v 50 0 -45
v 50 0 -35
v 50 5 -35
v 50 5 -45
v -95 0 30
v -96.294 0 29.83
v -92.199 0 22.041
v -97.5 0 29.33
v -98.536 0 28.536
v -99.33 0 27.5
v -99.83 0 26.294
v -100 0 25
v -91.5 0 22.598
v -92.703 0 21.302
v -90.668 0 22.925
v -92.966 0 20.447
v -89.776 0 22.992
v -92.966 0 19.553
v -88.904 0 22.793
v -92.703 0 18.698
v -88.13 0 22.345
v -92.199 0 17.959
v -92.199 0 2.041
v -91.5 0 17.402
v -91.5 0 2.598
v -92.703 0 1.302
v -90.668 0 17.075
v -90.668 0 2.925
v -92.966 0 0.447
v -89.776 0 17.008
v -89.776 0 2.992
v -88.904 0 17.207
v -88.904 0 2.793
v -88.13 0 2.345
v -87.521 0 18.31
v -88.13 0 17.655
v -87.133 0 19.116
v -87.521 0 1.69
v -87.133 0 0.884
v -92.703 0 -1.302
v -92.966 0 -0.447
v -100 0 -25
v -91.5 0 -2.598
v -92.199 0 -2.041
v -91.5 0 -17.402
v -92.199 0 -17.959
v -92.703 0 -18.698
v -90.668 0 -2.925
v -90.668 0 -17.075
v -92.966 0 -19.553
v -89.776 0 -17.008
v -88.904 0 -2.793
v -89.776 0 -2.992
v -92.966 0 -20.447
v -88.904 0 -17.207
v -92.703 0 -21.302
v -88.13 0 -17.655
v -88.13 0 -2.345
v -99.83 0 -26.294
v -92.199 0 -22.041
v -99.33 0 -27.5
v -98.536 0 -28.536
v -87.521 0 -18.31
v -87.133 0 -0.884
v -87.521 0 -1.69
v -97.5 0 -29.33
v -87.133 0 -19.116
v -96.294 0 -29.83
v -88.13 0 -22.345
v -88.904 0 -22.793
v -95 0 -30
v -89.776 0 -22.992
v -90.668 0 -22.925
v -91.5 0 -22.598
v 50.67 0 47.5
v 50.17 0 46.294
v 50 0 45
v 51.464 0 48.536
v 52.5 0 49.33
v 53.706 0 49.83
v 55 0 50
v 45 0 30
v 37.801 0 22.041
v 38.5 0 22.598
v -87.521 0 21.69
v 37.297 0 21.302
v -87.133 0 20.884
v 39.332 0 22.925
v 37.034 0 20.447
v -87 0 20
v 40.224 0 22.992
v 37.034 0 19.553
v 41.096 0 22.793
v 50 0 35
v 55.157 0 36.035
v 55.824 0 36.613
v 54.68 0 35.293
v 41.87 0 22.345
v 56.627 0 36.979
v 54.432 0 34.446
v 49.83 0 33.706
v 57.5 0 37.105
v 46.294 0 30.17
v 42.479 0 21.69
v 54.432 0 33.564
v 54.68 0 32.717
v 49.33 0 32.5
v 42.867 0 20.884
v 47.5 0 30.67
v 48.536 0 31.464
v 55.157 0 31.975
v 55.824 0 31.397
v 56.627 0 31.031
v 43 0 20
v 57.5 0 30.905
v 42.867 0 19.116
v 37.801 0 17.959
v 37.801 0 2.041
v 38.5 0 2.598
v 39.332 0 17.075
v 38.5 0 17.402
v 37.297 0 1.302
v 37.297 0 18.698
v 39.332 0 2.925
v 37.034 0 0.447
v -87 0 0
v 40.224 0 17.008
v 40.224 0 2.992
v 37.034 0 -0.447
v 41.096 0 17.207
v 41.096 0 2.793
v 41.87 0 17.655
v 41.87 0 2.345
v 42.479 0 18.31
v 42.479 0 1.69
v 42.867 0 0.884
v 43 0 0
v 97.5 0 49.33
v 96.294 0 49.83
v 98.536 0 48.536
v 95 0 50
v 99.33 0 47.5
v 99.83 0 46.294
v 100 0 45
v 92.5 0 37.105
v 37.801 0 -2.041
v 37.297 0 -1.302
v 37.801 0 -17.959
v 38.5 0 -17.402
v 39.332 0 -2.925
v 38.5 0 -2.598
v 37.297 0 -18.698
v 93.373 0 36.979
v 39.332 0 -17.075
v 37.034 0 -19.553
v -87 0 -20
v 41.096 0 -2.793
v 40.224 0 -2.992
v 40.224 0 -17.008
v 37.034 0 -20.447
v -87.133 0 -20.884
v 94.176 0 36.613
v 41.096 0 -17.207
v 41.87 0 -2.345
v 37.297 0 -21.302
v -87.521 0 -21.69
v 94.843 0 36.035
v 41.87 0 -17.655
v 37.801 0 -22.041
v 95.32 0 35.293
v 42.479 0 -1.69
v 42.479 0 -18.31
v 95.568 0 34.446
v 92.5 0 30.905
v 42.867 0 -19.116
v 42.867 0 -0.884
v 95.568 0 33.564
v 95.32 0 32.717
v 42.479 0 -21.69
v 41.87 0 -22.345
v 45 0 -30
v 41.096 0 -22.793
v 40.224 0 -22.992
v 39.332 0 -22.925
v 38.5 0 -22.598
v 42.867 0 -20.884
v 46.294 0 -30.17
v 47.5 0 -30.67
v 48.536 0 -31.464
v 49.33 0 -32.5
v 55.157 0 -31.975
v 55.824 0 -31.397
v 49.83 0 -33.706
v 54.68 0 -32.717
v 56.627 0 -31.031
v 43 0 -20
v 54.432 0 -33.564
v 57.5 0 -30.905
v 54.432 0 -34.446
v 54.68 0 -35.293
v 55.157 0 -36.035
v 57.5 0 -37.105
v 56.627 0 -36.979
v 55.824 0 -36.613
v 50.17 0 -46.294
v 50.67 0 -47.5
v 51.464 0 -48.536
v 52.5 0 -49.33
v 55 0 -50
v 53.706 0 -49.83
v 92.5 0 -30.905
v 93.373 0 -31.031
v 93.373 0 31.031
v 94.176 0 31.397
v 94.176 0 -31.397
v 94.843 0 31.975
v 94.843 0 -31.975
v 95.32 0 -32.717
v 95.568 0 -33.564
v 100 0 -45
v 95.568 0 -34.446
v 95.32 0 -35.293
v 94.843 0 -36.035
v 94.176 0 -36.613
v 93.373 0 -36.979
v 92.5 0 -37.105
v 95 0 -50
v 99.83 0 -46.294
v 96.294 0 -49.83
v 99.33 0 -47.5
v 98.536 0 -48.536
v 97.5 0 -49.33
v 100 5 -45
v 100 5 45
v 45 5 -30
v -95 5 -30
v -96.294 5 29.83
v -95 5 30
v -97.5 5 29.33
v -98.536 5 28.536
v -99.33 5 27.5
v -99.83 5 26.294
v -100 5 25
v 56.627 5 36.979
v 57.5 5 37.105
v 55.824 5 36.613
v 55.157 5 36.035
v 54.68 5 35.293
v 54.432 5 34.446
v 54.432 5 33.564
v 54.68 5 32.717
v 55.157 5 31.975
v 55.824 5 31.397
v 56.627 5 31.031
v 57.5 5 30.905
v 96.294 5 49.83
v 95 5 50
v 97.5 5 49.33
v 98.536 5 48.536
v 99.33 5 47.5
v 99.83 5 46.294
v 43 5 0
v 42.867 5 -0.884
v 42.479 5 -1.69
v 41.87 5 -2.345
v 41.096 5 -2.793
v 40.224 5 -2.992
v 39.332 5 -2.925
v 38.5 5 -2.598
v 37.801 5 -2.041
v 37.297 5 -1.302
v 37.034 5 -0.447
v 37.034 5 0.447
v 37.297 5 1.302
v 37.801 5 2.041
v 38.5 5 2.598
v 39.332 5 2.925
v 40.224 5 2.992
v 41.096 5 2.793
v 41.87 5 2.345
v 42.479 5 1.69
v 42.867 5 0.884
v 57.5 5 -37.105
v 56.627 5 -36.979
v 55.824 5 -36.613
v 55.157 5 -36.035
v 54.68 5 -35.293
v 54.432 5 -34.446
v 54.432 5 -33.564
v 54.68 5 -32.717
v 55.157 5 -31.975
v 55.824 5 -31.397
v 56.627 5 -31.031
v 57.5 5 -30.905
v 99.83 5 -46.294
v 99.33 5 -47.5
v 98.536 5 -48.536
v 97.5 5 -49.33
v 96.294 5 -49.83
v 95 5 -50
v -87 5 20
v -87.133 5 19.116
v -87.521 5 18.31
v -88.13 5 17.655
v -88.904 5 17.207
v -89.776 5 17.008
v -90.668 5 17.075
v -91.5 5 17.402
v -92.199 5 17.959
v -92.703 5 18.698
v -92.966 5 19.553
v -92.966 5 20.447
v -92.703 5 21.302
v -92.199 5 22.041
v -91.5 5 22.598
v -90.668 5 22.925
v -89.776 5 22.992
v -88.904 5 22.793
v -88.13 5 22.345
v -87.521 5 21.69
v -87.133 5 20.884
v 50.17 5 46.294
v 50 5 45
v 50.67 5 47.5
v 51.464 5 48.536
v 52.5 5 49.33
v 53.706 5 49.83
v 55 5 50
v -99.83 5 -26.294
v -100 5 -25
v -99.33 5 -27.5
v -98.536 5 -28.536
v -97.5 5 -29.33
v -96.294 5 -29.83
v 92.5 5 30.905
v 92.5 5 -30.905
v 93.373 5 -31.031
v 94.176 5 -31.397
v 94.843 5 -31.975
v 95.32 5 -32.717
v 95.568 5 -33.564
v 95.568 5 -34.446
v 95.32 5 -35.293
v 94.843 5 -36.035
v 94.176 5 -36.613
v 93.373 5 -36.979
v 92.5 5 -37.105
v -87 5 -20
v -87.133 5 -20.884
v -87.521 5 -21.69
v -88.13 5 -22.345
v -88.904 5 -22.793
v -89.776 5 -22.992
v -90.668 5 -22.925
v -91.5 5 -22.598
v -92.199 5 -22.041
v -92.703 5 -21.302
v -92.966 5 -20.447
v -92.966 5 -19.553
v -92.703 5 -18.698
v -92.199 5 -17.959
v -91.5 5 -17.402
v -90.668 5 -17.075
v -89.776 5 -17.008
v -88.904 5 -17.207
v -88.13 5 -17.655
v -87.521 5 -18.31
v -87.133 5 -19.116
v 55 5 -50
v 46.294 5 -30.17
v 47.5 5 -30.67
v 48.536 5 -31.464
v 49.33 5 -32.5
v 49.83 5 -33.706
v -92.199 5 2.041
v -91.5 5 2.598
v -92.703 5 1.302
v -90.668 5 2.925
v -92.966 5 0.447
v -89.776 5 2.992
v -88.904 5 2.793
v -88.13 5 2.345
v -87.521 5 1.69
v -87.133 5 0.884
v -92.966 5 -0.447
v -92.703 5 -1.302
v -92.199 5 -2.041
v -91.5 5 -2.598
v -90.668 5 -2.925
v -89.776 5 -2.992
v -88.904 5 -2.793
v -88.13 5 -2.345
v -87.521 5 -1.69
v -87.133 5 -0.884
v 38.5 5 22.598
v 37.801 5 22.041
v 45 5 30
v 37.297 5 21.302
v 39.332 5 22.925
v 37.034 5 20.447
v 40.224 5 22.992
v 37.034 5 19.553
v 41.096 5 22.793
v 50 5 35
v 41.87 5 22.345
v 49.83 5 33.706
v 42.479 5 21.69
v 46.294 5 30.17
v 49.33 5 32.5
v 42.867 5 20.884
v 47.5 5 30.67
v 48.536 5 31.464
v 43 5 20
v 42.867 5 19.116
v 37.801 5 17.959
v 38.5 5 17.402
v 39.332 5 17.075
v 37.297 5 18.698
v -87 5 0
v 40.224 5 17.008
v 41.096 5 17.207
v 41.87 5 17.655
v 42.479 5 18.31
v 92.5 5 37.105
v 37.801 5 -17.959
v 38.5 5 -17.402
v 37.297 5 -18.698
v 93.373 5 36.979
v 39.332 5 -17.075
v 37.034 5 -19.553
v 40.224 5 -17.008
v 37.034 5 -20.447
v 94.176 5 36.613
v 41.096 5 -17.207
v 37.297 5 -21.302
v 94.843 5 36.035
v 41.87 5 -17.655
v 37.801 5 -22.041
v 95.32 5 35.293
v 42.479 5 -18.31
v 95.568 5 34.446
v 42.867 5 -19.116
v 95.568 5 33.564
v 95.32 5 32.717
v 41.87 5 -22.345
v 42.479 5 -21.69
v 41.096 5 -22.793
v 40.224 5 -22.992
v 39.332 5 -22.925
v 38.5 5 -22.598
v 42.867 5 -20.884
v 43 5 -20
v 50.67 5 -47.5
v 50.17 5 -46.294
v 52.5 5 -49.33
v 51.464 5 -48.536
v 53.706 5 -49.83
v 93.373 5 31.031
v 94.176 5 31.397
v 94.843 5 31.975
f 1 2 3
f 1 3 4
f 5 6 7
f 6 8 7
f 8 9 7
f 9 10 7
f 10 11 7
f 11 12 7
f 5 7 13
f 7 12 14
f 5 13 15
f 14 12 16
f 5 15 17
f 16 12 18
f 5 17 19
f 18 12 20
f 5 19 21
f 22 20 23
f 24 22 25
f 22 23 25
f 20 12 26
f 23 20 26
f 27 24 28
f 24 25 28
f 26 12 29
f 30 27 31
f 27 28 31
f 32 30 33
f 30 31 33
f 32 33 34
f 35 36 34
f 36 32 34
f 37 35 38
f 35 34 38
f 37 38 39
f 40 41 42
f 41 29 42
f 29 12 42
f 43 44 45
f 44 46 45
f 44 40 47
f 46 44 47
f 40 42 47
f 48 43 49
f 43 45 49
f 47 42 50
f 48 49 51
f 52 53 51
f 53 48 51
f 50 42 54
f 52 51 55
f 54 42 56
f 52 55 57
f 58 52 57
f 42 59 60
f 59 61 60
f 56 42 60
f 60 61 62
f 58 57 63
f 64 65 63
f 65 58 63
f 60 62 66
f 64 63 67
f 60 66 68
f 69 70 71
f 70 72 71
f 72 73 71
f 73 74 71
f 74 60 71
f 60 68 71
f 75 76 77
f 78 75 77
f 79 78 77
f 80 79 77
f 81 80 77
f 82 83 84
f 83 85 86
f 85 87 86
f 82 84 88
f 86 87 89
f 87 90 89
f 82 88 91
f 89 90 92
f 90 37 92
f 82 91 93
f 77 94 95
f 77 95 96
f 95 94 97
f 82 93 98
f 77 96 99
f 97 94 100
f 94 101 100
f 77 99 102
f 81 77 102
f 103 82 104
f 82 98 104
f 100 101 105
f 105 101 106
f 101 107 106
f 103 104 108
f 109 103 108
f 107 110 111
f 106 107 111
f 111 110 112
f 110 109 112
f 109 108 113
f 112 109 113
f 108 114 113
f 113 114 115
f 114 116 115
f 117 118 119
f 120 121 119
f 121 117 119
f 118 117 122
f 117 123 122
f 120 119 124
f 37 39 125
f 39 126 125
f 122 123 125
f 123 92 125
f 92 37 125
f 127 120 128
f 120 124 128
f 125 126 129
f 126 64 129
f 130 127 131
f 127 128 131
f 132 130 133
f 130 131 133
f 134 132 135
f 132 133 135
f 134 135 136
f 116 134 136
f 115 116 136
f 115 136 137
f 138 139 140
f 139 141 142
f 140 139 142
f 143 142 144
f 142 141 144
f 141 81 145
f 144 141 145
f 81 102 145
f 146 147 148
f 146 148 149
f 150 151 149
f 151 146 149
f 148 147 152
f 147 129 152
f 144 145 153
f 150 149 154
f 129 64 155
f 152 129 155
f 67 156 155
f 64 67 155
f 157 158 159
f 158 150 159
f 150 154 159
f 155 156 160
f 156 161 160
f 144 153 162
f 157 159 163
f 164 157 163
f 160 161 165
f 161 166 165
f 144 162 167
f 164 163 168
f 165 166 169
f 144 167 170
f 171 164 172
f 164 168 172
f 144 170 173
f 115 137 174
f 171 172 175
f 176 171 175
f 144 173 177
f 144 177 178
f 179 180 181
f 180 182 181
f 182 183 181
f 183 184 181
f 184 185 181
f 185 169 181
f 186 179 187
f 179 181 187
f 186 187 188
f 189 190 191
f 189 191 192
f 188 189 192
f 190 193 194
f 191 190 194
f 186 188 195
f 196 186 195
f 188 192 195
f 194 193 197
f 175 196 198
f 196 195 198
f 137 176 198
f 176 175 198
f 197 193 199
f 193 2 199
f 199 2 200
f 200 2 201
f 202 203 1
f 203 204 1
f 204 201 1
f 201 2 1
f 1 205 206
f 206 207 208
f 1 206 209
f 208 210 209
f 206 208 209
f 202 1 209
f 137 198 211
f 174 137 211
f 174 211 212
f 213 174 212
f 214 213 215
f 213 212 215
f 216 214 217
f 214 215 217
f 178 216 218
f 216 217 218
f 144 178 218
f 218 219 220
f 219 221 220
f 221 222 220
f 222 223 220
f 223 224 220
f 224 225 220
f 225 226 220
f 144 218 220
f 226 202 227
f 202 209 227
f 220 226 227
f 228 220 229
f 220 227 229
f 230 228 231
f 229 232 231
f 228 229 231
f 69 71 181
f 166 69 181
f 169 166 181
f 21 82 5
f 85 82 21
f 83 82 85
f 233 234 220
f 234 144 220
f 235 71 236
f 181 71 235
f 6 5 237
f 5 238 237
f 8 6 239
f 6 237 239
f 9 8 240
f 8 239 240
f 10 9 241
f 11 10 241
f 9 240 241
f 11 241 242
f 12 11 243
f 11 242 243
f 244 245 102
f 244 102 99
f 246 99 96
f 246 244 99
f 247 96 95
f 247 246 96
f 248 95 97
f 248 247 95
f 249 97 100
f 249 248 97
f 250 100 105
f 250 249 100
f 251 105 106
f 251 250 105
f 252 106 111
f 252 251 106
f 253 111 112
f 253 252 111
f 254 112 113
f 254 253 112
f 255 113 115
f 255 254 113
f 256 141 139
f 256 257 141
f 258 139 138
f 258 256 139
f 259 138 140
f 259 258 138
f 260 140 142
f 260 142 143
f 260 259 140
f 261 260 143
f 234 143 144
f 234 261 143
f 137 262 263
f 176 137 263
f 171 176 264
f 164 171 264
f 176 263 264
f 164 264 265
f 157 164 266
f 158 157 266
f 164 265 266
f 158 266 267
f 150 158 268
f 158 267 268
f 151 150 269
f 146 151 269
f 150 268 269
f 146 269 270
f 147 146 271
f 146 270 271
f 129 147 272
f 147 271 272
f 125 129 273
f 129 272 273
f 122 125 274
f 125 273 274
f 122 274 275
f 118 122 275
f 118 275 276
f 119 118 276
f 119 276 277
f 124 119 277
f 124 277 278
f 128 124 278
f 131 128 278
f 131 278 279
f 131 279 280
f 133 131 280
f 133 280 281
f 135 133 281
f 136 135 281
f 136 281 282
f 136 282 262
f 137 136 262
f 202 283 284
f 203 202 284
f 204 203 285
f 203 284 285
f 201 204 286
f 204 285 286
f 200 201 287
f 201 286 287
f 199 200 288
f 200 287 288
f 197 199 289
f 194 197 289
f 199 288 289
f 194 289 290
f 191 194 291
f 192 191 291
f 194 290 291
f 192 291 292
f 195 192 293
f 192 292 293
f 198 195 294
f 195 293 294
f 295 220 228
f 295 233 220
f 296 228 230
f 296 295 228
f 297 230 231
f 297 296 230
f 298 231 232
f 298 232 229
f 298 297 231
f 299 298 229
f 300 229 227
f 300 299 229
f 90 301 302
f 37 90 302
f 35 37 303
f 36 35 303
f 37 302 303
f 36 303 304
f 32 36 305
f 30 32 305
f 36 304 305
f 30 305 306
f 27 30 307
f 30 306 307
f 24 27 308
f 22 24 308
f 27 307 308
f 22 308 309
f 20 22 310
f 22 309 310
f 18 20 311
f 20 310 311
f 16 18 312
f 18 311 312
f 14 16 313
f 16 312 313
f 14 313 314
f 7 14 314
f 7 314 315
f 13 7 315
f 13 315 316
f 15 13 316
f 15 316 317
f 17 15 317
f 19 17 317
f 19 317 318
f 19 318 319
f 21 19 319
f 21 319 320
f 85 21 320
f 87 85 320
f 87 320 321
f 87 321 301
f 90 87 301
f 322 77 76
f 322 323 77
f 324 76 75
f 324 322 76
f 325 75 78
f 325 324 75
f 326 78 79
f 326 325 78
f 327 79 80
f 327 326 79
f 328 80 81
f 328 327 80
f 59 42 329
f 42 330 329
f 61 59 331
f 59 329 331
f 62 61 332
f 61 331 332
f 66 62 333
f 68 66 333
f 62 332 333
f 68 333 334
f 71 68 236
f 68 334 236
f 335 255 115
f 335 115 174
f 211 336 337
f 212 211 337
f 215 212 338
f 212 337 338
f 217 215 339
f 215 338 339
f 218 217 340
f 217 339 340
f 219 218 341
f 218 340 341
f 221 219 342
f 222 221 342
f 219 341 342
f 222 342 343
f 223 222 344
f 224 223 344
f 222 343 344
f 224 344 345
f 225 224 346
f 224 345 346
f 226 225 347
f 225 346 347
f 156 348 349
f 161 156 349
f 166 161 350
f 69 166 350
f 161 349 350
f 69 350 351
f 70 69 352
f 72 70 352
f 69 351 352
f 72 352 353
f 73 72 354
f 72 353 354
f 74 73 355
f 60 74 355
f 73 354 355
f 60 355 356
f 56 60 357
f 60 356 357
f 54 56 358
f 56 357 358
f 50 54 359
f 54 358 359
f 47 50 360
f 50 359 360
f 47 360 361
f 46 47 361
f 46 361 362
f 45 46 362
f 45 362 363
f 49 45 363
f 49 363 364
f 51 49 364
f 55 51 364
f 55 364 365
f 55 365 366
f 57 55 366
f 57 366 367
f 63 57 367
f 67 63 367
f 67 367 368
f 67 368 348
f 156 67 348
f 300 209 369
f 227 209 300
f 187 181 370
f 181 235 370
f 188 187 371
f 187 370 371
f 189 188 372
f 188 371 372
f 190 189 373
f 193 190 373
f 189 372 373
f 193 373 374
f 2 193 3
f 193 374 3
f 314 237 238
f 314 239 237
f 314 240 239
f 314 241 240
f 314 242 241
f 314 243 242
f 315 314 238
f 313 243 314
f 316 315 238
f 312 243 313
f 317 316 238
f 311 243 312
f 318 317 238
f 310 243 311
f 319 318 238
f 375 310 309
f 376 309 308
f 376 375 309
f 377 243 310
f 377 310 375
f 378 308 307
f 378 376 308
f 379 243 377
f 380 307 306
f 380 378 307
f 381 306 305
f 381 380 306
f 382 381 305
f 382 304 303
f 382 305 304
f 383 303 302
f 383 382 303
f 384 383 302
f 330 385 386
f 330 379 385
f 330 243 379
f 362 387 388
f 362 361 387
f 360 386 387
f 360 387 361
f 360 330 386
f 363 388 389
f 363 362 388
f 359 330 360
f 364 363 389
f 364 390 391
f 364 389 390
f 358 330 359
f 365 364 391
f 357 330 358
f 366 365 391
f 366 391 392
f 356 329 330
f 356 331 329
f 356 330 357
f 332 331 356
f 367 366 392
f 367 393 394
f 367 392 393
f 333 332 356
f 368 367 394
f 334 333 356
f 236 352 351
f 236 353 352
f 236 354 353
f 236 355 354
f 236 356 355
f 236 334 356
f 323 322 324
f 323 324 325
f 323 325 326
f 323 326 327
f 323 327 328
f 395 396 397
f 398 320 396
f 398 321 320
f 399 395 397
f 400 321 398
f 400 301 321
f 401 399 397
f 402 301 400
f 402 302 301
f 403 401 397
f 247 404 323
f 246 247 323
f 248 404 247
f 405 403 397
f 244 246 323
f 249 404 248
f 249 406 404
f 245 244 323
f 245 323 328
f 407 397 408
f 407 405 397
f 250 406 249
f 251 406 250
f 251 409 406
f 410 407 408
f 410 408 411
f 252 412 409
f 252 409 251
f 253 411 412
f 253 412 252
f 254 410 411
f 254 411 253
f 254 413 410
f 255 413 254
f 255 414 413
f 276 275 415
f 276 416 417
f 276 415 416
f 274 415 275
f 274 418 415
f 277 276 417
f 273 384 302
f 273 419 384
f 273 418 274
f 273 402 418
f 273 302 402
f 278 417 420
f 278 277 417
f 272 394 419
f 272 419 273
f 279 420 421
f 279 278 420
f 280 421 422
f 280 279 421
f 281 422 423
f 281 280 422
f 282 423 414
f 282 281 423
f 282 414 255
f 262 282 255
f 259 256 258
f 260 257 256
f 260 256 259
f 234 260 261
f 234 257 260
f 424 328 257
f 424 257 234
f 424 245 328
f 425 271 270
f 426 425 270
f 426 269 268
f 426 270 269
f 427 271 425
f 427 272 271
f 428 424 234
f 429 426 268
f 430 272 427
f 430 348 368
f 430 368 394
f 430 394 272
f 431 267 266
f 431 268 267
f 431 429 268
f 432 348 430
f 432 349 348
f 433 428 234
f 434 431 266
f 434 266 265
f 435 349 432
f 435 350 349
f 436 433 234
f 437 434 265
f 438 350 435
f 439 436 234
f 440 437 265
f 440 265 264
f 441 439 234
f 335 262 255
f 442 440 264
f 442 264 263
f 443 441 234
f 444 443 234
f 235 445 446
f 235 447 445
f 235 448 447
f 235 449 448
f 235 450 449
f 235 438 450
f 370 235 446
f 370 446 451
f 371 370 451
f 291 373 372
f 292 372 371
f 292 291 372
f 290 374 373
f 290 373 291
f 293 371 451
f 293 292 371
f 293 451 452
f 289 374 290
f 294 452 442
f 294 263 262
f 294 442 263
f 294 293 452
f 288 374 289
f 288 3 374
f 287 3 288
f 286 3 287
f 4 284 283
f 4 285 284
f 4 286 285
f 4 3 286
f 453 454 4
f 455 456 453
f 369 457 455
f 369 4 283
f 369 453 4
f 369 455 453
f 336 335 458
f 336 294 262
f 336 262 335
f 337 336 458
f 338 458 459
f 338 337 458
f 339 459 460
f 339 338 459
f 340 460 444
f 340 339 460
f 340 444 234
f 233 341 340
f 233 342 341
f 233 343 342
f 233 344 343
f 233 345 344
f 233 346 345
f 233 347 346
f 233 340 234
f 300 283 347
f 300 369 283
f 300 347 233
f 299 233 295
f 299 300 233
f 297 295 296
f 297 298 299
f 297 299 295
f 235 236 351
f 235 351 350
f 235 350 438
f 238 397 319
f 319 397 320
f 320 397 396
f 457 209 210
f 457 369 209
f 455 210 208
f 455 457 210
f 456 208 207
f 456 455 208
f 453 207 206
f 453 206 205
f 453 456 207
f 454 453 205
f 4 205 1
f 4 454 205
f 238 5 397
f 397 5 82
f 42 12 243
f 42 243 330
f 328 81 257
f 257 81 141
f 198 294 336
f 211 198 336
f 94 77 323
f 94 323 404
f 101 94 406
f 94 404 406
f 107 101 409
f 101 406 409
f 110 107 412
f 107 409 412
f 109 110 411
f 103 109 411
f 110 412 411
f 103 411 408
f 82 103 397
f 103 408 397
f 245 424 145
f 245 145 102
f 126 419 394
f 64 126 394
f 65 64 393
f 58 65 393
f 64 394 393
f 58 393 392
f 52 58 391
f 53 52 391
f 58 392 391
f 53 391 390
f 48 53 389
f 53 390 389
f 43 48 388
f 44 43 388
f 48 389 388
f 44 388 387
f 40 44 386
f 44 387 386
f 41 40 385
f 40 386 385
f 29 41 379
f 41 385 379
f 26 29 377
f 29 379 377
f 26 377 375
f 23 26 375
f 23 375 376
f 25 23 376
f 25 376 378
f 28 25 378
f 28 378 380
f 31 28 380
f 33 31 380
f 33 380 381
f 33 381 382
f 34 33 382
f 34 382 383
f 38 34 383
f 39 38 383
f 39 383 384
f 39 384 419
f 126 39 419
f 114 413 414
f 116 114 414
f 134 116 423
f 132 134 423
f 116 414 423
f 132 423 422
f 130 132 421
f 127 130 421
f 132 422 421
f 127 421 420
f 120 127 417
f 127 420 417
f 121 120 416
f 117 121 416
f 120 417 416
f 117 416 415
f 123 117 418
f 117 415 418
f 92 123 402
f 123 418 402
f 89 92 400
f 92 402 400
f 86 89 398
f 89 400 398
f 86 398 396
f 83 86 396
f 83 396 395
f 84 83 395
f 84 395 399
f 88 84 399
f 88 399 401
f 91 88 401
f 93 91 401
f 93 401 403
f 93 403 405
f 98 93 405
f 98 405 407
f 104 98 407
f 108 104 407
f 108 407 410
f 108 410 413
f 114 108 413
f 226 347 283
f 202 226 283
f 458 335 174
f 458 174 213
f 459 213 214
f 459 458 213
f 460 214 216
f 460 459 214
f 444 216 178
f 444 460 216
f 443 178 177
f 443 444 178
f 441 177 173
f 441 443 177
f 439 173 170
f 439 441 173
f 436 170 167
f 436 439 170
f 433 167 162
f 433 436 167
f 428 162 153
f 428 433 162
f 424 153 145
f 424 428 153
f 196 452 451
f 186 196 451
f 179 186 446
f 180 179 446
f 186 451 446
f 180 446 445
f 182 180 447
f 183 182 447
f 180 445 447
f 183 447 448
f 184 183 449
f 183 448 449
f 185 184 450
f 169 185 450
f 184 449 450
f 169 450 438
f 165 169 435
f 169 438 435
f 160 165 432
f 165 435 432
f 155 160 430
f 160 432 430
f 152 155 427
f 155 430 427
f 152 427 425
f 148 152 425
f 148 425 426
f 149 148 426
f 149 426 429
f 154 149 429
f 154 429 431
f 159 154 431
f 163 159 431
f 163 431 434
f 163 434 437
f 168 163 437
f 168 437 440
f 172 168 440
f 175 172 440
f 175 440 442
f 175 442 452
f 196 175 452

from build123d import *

# Parameters (mm, degrees)
SKETCH1_W           = 200
SKETCH1_H           = 60
BOSS_EXTRUDE1_DEPTH = 5
SKETCH2_R           = 3
CUT_EXTRUDE1_DEPTH  = 6
SKETCH3_W           = 50
SKETCH3_H           = 100
BOSS_EXTRUDE2_DEPTH = 5
CUT_EXTRUDE2_DEPTH  = 6
FILLET1_R           = 5


with BuildPart() as part:
    # Sketch1 → Boss-Extrude1 (new body)
    with BuildSketch(Plane(origin=(0, 0, 0), x_dir=(1, 0, 0), z_dir=(0, 1, 0))):
        Rectangle(SKETCH1_W, SKETCH1_H)
    extrude(amount=BOSS_EXTRUDE1_DEPTH)

    # Sketch2 → Cut-Extrude1 (cut, through all)
    with BuildSketch(Plane(origin=(0, 5, 0), x_dir=(1, 0, 0), z_dir=(0, 1, 0))):
        with Locations((-90, 20)):
            Circle(SKETCH2_R)
        with Locations((-90, -20)):
            Circle(SKETCH2_R)
        with Locations((40, -20)):
            Circle(SKETCH2_R)
        with Locations((40, 20)):
            Circle(SKETCH2_R)
        with Locations((-90, 0)):
            Circle(SKETCH2_R)
        with Locations((40, 0)):
            Circle(SKETCH2_R)
    extrude(amount=-CUT_EXTRUDE1_DEPTH, mode=Mode.SUBTRACT)

    # Sketch3 → Boss-Extrude2 (add)
    with BuildSketch(Plane(origin=(0, 0, 0), x_dir=(1, 0, 0), z_dir=(0, 1, 0))):
        with Locations((75, 0)):
            Rectangle(SKETCH3_W, SKETCH3_H)
    extrude(amount=BOSS_EXTRUDE2_DEPTH)

    # Sketch4 → Cut-Extrude2 (cut, through all)
    with BuildSketch(Plane(origin=(0, 5, 0), x_dir=(1, 0, 0), z_dir=(0, 1, 0))):
        with BuildLine():
            Line((57.5, -30.905), (92.5, -30.905))
            ThreePointArc((92.5, -30.905), (95.6, -34.005), (92.5, -37.105))
            Line((92.5, -37.105), (57.5, -37.105))
            ThreePointArc((57.5, -37.105), (54.4, -34.005), (57.5, -30.905))
        make_face()
    cut_extrude2 = extrude(amount=-CUT_EXTRUDE2_DEPTH, mode=Mode.SUBTRACT)

    # Mirror1: Cut-Extrude2 across plane
    add(cut_extrude2.mirror(Plane.XY), mode=Mode.SUBTRACT)

    # Fillet1
    fillet1_edges = [part.edges().sort_by_distance(p)[0] for p in [
        (100, 2.5, 50),
        (50, 2.5, -30),
        (50, 2.5, -50),
        (50, 2.5, 30),
        (100, 2.5, -50),
        (50, 2.5, 50),
        (-100, 2.5, 30),
        (-100, 2.5, -30),
    ]]
    fillet(fillet1_edges, radius=FILLET1_R)


solid = part.part
